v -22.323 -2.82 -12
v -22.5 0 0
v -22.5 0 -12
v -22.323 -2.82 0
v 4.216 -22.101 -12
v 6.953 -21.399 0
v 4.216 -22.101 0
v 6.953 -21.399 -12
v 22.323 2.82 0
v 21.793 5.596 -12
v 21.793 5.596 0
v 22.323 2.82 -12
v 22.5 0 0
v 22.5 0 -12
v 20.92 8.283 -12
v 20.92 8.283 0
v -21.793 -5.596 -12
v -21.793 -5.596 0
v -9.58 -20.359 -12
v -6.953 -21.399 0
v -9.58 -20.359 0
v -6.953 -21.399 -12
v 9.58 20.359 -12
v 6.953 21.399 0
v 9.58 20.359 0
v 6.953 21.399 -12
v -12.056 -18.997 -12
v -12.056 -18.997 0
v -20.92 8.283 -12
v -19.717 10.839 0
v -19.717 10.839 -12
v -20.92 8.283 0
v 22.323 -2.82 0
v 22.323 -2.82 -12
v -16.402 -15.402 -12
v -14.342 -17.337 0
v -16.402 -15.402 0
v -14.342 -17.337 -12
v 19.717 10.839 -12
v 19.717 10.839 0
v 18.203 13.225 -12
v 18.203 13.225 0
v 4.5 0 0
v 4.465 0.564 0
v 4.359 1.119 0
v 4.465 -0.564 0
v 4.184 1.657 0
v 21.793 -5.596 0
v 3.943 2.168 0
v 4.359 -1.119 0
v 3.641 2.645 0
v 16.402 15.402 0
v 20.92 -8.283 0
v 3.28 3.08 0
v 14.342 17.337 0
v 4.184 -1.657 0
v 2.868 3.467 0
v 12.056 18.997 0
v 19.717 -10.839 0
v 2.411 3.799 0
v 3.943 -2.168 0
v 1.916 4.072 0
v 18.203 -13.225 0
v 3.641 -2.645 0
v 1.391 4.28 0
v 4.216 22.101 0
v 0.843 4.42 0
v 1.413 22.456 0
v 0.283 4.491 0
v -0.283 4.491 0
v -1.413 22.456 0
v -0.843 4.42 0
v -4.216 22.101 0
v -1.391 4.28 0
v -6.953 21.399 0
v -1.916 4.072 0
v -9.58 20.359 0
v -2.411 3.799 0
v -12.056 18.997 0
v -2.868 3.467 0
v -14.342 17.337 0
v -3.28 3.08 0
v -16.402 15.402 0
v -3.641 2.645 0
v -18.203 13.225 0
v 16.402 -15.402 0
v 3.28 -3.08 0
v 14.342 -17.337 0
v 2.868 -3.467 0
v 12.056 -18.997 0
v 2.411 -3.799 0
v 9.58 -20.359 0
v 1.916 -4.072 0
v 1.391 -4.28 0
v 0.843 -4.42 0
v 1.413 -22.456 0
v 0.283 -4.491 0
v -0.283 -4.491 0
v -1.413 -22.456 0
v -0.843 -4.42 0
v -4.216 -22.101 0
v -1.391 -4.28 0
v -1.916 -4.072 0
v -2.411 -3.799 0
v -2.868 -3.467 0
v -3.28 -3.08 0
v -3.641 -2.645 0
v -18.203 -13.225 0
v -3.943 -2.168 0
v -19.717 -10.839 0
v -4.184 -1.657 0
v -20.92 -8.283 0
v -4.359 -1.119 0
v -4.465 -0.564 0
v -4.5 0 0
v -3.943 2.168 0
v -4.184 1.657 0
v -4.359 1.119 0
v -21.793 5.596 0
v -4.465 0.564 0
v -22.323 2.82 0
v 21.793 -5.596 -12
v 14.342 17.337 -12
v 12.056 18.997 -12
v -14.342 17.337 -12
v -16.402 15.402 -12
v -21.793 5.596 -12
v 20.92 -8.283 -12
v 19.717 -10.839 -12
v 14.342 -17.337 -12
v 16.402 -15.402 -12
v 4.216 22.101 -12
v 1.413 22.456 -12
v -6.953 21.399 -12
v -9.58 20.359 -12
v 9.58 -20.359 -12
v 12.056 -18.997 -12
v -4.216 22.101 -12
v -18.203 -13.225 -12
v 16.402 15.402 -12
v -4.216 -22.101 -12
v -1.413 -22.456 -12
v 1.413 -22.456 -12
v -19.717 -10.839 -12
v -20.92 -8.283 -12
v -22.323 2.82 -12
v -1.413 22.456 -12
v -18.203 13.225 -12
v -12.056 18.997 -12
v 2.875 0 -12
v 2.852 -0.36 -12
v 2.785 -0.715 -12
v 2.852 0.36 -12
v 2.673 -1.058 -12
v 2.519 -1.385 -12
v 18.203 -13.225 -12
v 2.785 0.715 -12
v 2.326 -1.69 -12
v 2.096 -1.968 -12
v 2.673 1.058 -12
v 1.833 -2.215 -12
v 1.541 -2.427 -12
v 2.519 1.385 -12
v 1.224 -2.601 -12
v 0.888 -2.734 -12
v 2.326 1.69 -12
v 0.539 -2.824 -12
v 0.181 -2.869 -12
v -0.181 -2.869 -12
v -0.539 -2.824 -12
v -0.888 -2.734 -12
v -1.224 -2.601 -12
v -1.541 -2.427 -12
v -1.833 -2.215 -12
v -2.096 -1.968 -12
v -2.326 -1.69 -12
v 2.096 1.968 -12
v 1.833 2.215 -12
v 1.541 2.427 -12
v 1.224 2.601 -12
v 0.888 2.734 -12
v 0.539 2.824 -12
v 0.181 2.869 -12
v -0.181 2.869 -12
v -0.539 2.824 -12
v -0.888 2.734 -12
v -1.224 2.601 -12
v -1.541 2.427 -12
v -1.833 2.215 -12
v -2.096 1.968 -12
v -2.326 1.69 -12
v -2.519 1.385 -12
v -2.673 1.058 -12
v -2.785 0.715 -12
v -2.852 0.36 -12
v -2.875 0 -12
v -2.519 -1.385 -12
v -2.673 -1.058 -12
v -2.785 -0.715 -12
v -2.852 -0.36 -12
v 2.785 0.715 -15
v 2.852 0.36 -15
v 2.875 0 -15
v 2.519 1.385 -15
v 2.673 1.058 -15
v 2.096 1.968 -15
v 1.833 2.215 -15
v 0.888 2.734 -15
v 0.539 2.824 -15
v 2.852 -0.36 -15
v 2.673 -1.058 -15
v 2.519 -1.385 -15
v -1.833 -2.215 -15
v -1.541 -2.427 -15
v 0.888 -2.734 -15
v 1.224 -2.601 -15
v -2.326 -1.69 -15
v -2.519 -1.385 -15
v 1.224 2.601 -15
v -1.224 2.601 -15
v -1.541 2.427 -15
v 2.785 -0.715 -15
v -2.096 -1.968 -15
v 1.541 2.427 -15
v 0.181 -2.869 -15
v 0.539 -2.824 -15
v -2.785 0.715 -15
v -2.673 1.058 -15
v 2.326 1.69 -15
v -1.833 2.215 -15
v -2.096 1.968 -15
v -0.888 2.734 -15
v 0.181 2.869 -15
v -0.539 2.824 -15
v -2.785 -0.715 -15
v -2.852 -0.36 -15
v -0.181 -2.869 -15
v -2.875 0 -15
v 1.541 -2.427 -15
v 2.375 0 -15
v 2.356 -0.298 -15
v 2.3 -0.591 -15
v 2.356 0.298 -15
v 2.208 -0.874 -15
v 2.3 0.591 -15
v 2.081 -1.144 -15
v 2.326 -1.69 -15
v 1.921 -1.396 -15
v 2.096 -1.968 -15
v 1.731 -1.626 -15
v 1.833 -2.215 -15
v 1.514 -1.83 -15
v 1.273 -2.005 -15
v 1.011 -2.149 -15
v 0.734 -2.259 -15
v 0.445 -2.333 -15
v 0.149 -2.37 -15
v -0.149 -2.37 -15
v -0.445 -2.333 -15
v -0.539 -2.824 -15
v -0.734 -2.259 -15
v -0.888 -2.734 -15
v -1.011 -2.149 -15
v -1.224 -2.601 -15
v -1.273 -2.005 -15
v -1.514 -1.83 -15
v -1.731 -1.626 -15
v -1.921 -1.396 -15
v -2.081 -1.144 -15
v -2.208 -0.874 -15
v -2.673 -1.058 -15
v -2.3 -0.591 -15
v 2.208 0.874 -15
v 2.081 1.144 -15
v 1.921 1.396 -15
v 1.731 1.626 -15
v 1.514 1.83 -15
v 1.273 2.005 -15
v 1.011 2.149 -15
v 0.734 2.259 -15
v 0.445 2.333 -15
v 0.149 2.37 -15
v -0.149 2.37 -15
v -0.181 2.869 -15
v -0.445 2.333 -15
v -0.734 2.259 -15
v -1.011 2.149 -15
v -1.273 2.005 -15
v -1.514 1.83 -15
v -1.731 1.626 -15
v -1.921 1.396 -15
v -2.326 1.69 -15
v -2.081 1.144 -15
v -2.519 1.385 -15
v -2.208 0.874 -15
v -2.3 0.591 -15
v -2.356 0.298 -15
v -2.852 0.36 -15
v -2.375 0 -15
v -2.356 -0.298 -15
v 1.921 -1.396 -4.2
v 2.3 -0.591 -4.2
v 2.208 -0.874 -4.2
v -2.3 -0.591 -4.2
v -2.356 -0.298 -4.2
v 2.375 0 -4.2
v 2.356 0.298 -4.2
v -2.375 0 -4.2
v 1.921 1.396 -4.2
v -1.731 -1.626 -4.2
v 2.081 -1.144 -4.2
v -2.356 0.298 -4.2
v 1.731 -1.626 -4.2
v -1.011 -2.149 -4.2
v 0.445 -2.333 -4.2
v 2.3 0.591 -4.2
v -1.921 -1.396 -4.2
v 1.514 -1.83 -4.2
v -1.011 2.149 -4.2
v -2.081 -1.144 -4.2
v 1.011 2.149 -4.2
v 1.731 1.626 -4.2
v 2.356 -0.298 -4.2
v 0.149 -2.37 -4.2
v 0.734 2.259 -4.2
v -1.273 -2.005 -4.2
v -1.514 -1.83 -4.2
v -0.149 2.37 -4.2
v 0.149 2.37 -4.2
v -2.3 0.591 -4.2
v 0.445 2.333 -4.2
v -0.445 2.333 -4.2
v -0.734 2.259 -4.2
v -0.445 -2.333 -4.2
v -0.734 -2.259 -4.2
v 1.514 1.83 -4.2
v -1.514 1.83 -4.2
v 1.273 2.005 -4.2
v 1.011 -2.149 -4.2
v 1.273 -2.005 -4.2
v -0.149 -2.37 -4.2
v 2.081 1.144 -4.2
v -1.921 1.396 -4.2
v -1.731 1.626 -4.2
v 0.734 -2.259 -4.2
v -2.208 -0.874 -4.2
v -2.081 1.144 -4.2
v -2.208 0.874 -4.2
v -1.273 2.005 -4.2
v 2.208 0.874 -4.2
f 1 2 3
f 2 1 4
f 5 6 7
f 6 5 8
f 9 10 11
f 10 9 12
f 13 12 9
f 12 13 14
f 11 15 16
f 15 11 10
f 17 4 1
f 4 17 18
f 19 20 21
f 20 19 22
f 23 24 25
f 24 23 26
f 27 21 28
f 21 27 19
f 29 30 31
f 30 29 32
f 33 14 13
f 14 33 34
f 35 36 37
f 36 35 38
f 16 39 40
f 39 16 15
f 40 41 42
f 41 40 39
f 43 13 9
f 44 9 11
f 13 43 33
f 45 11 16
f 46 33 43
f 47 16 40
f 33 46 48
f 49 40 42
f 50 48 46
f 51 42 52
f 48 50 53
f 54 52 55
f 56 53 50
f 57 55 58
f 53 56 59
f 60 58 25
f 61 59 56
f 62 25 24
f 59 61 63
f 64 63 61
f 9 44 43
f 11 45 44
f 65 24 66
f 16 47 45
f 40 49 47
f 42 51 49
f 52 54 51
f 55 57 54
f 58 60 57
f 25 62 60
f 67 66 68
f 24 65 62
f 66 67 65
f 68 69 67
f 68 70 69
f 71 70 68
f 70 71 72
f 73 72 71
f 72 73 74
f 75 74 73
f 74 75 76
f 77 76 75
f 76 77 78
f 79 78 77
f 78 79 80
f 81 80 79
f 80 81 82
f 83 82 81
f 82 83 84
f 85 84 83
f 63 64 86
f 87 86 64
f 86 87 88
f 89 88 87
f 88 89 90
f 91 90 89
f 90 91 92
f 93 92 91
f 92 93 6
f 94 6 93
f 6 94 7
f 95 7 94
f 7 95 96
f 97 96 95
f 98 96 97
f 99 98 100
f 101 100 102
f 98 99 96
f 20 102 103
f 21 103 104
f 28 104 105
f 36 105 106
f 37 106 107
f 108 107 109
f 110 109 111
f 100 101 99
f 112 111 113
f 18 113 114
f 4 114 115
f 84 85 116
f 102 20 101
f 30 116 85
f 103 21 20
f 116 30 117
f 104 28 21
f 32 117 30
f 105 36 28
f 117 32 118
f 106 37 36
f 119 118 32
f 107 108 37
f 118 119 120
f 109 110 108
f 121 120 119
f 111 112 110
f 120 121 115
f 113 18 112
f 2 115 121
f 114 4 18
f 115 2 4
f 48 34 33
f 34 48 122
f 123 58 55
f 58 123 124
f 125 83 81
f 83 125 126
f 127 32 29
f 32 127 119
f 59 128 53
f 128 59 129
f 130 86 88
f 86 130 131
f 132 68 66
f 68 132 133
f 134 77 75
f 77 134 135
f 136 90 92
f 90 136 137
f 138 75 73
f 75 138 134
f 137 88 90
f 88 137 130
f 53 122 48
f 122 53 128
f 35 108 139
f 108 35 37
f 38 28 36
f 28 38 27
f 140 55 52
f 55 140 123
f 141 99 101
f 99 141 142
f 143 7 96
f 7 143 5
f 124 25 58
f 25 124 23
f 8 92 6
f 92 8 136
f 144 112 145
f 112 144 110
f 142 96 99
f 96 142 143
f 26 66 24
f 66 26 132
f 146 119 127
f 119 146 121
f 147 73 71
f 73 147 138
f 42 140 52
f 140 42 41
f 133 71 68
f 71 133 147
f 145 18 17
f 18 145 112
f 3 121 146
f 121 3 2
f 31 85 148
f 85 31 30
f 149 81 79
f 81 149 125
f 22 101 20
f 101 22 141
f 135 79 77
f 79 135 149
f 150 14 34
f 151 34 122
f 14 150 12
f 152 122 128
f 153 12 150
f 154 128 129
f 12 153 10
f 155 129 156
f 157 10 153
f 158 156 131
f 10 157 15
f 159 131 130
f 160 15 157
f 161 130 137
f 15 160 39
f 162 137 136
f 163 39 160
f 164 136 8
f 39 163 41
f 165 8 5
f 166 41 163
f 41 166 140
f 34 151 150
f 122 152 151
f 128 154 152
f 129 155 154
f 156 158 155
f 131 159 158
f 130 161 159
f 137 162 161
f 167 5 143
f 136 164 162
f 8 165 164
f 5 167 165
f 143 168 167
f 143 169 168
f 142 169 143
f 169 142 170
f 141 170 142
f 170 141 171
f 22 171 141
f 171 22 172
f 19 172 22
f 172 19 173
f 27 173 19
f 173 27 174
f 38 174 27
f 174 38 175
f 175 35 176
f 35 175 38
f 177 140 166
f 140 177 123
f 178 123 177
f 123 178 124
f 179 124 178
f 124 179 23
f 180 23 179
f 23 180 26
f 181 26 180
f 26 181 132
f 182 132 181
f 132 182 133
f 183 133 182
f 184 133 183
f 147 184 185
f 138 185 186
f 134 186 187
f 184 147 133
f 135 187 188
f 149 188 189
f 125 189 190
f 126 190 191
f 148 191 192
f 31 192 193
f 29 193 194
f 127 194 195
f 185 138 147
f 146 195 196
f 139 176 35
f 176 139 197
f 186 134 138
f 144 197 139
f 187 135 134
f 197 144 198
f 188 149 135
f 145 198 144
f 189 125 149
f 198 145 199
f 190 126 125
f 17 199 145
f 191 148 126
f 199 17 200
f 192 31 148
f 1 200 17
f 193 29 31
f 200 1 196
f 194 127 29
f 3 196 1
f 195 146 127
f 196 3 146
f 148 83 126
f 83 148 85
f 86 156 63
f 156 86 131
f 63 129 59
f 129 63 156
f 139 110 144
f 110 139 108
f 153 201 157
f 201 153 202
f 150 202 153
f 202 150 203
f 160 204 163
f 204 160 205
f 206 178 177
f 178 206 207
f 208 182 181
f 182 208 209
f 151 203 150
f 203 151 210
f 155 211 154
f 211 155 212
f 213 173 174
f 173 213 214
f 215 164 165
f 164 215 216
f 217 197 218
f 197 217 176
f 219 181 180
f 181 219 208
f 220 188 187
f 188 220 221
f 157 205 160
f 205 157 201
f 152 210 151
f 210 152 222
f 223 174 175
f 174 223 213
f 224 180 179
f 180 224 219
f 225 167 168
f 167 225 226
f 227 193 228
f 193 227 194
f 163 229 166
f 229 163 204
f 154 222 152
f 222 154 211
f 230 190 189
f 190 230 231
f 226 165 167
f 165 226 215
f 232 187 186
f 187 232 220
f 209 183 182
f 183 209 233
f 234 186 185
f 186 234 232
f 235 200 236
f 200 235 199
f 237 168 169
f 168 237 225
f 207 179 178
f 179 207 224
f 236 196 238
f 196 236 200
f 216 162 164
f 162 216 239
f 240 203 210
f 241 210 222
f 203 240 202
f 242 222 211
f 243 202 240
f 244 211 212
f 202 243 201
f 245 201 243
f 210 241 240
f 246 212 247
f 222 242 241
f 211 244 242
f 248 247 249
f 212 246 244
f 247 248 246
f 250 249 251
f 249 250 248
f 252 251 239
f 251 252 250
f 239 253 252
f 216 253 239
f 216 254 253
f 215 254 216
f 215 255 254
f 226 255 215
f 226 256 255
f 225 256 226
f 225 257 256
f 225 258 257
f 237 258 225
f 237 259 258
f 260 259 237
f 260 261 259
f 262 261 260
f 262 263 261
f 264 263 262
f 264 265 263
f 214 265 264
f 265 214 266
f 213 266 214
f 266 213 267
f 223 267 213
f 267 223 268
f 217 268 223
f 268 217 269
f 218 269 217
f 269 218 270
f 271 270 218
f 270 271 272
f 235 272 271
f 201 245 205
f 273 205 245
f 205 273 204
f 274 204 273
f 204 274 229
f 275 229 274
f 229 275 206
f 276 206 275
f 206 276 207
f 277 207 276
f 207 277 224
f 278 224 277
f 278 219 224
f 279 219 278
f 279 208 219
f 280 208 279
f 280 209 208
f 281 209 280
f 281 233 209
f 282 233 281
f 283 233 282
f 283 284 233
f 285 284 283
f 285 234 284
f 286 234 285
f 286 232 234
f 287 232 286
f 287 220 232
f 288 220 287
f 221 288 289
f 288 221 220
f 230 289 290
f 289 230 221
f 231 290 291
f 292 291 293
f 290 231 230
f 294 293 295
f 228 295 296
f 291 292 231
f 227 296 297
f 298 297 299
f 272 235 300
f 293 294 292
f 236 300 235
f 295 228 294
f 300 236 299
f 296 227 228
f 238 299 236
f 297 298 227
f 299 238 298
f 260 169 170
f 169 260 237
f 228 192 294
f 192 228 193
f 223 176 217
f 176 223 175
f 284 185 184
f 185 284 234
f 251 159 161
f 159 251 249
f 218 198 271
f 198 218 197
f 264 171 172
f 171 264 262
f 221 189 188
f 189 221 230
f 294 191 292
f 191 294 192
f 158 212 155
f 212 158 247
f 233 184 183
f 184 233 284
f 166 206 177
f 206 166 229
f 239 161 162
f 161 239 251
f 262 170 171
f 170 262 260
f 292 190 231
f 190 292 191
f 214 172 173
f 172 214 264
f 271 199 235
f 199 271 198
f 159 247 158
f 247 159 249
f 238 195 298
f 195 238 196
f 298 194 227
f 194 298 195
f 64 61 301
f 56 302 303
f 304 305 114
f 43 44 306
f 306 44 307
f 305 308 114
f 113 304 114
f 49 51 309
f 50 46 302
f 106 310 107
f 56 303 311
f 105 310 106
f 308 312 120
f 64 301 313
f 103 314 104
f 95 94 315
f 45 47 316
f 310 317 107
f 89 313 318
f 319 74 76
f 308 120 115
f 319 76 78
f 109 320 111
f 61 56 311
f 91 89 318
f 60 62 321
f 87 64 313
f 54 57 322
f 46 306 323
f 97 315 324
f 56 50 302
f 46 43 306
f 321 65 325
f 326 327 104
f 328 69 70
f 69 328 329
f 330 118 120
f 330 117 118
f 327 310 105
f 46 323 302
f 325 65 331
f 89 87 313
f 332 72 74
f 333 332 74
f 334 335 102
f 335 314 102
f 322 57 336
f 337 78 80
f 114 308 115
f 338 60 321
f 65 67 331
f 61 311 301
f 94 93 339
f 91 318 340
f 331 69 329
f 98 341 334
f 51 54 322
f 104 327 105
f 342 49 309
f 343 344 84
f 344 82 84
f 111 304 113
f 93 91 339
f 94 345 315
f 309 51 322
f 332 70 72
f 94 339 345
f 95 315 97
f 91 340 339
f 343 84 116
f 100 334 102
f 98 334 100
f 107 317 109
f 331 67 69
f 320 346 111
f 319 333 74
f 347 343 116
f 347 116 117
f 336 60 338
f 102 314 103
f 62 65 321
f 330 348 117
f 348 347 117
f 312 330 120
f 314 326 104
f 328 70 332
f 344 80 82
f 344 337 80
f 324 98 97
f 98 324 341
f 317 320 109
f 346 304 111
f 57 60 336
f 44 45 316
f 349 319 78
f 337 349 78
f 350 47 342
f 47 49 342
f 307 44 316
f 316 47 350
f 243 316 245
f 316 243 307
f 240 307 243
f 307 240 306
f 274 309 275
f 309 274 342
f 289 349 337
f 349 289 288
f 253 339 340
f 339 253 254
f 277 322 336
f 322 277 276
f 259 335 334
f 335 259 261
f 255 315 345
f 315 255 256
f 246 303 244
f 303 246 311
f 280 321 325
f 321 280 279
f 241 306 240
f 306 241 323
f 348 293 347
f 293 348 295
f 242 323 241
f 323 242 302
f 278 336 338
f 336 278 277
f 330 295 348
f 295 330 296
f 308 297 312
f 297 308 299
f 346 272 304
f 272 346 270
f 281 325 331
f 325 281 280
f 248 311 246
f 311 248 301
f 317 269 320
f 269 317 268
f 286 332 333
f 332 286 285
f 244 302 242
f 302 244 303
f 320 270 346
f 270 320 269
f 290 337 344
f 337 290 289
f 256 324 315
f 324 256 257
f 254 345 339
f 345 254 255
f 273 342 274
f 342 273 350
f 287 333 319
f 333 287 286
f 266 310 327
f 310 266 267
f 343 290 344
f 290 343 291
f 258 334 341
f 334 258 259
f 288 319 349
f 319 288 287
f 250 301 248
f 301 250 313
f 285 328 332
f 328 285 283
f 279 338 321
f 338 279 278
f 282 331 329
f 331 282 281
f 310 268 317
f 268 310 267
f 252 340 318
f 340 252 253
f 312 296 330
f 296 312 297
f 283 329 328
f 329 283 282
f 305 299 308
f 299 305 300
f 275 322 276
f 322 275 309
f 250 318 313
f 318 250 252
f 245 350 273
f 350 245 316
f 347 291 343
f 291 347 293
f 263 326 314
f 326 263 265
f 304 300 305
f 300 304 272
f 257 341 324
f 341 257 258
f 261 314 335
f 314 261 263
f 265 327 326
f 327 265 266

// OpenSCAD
$fn = 50;


difference() {
	union() {
		translate(v = [0, 0, -12.0000000000]) {
			cylinder(h = 12, r = 22.5000000000);
		}
		#translate(v = [0, 0, -15.0000000000]) {
			cylinder(h = 15, r = 2.8750000000);
		}
	}
	union() {
		translate(v = [0, 0, 0]) {
			rotate(a = [0, 0, 0]) {
				difference() {
					union() {
						translate(v = [0, 0, -15.0000000000]) {
							cylinder(h = 15, r = 2.2500000000);
						}
						translate(v = [0, 0, -4.2000000000]) {
							cylinder(h = 4.2000000000, r1 = 2.3750000000, r2 = 4.5000000000);
						}
						translate(v = [0, 0, -15.0000000000]) {
							cylinder(h = 15, r = 2.3750000000);
						}
						translate(v = [0, 0, -15.0000000000]) {
							cylinder(h = 15, r = 2.2500000000);
						}
					}
					union();
				}
			}
		}
	}
}
